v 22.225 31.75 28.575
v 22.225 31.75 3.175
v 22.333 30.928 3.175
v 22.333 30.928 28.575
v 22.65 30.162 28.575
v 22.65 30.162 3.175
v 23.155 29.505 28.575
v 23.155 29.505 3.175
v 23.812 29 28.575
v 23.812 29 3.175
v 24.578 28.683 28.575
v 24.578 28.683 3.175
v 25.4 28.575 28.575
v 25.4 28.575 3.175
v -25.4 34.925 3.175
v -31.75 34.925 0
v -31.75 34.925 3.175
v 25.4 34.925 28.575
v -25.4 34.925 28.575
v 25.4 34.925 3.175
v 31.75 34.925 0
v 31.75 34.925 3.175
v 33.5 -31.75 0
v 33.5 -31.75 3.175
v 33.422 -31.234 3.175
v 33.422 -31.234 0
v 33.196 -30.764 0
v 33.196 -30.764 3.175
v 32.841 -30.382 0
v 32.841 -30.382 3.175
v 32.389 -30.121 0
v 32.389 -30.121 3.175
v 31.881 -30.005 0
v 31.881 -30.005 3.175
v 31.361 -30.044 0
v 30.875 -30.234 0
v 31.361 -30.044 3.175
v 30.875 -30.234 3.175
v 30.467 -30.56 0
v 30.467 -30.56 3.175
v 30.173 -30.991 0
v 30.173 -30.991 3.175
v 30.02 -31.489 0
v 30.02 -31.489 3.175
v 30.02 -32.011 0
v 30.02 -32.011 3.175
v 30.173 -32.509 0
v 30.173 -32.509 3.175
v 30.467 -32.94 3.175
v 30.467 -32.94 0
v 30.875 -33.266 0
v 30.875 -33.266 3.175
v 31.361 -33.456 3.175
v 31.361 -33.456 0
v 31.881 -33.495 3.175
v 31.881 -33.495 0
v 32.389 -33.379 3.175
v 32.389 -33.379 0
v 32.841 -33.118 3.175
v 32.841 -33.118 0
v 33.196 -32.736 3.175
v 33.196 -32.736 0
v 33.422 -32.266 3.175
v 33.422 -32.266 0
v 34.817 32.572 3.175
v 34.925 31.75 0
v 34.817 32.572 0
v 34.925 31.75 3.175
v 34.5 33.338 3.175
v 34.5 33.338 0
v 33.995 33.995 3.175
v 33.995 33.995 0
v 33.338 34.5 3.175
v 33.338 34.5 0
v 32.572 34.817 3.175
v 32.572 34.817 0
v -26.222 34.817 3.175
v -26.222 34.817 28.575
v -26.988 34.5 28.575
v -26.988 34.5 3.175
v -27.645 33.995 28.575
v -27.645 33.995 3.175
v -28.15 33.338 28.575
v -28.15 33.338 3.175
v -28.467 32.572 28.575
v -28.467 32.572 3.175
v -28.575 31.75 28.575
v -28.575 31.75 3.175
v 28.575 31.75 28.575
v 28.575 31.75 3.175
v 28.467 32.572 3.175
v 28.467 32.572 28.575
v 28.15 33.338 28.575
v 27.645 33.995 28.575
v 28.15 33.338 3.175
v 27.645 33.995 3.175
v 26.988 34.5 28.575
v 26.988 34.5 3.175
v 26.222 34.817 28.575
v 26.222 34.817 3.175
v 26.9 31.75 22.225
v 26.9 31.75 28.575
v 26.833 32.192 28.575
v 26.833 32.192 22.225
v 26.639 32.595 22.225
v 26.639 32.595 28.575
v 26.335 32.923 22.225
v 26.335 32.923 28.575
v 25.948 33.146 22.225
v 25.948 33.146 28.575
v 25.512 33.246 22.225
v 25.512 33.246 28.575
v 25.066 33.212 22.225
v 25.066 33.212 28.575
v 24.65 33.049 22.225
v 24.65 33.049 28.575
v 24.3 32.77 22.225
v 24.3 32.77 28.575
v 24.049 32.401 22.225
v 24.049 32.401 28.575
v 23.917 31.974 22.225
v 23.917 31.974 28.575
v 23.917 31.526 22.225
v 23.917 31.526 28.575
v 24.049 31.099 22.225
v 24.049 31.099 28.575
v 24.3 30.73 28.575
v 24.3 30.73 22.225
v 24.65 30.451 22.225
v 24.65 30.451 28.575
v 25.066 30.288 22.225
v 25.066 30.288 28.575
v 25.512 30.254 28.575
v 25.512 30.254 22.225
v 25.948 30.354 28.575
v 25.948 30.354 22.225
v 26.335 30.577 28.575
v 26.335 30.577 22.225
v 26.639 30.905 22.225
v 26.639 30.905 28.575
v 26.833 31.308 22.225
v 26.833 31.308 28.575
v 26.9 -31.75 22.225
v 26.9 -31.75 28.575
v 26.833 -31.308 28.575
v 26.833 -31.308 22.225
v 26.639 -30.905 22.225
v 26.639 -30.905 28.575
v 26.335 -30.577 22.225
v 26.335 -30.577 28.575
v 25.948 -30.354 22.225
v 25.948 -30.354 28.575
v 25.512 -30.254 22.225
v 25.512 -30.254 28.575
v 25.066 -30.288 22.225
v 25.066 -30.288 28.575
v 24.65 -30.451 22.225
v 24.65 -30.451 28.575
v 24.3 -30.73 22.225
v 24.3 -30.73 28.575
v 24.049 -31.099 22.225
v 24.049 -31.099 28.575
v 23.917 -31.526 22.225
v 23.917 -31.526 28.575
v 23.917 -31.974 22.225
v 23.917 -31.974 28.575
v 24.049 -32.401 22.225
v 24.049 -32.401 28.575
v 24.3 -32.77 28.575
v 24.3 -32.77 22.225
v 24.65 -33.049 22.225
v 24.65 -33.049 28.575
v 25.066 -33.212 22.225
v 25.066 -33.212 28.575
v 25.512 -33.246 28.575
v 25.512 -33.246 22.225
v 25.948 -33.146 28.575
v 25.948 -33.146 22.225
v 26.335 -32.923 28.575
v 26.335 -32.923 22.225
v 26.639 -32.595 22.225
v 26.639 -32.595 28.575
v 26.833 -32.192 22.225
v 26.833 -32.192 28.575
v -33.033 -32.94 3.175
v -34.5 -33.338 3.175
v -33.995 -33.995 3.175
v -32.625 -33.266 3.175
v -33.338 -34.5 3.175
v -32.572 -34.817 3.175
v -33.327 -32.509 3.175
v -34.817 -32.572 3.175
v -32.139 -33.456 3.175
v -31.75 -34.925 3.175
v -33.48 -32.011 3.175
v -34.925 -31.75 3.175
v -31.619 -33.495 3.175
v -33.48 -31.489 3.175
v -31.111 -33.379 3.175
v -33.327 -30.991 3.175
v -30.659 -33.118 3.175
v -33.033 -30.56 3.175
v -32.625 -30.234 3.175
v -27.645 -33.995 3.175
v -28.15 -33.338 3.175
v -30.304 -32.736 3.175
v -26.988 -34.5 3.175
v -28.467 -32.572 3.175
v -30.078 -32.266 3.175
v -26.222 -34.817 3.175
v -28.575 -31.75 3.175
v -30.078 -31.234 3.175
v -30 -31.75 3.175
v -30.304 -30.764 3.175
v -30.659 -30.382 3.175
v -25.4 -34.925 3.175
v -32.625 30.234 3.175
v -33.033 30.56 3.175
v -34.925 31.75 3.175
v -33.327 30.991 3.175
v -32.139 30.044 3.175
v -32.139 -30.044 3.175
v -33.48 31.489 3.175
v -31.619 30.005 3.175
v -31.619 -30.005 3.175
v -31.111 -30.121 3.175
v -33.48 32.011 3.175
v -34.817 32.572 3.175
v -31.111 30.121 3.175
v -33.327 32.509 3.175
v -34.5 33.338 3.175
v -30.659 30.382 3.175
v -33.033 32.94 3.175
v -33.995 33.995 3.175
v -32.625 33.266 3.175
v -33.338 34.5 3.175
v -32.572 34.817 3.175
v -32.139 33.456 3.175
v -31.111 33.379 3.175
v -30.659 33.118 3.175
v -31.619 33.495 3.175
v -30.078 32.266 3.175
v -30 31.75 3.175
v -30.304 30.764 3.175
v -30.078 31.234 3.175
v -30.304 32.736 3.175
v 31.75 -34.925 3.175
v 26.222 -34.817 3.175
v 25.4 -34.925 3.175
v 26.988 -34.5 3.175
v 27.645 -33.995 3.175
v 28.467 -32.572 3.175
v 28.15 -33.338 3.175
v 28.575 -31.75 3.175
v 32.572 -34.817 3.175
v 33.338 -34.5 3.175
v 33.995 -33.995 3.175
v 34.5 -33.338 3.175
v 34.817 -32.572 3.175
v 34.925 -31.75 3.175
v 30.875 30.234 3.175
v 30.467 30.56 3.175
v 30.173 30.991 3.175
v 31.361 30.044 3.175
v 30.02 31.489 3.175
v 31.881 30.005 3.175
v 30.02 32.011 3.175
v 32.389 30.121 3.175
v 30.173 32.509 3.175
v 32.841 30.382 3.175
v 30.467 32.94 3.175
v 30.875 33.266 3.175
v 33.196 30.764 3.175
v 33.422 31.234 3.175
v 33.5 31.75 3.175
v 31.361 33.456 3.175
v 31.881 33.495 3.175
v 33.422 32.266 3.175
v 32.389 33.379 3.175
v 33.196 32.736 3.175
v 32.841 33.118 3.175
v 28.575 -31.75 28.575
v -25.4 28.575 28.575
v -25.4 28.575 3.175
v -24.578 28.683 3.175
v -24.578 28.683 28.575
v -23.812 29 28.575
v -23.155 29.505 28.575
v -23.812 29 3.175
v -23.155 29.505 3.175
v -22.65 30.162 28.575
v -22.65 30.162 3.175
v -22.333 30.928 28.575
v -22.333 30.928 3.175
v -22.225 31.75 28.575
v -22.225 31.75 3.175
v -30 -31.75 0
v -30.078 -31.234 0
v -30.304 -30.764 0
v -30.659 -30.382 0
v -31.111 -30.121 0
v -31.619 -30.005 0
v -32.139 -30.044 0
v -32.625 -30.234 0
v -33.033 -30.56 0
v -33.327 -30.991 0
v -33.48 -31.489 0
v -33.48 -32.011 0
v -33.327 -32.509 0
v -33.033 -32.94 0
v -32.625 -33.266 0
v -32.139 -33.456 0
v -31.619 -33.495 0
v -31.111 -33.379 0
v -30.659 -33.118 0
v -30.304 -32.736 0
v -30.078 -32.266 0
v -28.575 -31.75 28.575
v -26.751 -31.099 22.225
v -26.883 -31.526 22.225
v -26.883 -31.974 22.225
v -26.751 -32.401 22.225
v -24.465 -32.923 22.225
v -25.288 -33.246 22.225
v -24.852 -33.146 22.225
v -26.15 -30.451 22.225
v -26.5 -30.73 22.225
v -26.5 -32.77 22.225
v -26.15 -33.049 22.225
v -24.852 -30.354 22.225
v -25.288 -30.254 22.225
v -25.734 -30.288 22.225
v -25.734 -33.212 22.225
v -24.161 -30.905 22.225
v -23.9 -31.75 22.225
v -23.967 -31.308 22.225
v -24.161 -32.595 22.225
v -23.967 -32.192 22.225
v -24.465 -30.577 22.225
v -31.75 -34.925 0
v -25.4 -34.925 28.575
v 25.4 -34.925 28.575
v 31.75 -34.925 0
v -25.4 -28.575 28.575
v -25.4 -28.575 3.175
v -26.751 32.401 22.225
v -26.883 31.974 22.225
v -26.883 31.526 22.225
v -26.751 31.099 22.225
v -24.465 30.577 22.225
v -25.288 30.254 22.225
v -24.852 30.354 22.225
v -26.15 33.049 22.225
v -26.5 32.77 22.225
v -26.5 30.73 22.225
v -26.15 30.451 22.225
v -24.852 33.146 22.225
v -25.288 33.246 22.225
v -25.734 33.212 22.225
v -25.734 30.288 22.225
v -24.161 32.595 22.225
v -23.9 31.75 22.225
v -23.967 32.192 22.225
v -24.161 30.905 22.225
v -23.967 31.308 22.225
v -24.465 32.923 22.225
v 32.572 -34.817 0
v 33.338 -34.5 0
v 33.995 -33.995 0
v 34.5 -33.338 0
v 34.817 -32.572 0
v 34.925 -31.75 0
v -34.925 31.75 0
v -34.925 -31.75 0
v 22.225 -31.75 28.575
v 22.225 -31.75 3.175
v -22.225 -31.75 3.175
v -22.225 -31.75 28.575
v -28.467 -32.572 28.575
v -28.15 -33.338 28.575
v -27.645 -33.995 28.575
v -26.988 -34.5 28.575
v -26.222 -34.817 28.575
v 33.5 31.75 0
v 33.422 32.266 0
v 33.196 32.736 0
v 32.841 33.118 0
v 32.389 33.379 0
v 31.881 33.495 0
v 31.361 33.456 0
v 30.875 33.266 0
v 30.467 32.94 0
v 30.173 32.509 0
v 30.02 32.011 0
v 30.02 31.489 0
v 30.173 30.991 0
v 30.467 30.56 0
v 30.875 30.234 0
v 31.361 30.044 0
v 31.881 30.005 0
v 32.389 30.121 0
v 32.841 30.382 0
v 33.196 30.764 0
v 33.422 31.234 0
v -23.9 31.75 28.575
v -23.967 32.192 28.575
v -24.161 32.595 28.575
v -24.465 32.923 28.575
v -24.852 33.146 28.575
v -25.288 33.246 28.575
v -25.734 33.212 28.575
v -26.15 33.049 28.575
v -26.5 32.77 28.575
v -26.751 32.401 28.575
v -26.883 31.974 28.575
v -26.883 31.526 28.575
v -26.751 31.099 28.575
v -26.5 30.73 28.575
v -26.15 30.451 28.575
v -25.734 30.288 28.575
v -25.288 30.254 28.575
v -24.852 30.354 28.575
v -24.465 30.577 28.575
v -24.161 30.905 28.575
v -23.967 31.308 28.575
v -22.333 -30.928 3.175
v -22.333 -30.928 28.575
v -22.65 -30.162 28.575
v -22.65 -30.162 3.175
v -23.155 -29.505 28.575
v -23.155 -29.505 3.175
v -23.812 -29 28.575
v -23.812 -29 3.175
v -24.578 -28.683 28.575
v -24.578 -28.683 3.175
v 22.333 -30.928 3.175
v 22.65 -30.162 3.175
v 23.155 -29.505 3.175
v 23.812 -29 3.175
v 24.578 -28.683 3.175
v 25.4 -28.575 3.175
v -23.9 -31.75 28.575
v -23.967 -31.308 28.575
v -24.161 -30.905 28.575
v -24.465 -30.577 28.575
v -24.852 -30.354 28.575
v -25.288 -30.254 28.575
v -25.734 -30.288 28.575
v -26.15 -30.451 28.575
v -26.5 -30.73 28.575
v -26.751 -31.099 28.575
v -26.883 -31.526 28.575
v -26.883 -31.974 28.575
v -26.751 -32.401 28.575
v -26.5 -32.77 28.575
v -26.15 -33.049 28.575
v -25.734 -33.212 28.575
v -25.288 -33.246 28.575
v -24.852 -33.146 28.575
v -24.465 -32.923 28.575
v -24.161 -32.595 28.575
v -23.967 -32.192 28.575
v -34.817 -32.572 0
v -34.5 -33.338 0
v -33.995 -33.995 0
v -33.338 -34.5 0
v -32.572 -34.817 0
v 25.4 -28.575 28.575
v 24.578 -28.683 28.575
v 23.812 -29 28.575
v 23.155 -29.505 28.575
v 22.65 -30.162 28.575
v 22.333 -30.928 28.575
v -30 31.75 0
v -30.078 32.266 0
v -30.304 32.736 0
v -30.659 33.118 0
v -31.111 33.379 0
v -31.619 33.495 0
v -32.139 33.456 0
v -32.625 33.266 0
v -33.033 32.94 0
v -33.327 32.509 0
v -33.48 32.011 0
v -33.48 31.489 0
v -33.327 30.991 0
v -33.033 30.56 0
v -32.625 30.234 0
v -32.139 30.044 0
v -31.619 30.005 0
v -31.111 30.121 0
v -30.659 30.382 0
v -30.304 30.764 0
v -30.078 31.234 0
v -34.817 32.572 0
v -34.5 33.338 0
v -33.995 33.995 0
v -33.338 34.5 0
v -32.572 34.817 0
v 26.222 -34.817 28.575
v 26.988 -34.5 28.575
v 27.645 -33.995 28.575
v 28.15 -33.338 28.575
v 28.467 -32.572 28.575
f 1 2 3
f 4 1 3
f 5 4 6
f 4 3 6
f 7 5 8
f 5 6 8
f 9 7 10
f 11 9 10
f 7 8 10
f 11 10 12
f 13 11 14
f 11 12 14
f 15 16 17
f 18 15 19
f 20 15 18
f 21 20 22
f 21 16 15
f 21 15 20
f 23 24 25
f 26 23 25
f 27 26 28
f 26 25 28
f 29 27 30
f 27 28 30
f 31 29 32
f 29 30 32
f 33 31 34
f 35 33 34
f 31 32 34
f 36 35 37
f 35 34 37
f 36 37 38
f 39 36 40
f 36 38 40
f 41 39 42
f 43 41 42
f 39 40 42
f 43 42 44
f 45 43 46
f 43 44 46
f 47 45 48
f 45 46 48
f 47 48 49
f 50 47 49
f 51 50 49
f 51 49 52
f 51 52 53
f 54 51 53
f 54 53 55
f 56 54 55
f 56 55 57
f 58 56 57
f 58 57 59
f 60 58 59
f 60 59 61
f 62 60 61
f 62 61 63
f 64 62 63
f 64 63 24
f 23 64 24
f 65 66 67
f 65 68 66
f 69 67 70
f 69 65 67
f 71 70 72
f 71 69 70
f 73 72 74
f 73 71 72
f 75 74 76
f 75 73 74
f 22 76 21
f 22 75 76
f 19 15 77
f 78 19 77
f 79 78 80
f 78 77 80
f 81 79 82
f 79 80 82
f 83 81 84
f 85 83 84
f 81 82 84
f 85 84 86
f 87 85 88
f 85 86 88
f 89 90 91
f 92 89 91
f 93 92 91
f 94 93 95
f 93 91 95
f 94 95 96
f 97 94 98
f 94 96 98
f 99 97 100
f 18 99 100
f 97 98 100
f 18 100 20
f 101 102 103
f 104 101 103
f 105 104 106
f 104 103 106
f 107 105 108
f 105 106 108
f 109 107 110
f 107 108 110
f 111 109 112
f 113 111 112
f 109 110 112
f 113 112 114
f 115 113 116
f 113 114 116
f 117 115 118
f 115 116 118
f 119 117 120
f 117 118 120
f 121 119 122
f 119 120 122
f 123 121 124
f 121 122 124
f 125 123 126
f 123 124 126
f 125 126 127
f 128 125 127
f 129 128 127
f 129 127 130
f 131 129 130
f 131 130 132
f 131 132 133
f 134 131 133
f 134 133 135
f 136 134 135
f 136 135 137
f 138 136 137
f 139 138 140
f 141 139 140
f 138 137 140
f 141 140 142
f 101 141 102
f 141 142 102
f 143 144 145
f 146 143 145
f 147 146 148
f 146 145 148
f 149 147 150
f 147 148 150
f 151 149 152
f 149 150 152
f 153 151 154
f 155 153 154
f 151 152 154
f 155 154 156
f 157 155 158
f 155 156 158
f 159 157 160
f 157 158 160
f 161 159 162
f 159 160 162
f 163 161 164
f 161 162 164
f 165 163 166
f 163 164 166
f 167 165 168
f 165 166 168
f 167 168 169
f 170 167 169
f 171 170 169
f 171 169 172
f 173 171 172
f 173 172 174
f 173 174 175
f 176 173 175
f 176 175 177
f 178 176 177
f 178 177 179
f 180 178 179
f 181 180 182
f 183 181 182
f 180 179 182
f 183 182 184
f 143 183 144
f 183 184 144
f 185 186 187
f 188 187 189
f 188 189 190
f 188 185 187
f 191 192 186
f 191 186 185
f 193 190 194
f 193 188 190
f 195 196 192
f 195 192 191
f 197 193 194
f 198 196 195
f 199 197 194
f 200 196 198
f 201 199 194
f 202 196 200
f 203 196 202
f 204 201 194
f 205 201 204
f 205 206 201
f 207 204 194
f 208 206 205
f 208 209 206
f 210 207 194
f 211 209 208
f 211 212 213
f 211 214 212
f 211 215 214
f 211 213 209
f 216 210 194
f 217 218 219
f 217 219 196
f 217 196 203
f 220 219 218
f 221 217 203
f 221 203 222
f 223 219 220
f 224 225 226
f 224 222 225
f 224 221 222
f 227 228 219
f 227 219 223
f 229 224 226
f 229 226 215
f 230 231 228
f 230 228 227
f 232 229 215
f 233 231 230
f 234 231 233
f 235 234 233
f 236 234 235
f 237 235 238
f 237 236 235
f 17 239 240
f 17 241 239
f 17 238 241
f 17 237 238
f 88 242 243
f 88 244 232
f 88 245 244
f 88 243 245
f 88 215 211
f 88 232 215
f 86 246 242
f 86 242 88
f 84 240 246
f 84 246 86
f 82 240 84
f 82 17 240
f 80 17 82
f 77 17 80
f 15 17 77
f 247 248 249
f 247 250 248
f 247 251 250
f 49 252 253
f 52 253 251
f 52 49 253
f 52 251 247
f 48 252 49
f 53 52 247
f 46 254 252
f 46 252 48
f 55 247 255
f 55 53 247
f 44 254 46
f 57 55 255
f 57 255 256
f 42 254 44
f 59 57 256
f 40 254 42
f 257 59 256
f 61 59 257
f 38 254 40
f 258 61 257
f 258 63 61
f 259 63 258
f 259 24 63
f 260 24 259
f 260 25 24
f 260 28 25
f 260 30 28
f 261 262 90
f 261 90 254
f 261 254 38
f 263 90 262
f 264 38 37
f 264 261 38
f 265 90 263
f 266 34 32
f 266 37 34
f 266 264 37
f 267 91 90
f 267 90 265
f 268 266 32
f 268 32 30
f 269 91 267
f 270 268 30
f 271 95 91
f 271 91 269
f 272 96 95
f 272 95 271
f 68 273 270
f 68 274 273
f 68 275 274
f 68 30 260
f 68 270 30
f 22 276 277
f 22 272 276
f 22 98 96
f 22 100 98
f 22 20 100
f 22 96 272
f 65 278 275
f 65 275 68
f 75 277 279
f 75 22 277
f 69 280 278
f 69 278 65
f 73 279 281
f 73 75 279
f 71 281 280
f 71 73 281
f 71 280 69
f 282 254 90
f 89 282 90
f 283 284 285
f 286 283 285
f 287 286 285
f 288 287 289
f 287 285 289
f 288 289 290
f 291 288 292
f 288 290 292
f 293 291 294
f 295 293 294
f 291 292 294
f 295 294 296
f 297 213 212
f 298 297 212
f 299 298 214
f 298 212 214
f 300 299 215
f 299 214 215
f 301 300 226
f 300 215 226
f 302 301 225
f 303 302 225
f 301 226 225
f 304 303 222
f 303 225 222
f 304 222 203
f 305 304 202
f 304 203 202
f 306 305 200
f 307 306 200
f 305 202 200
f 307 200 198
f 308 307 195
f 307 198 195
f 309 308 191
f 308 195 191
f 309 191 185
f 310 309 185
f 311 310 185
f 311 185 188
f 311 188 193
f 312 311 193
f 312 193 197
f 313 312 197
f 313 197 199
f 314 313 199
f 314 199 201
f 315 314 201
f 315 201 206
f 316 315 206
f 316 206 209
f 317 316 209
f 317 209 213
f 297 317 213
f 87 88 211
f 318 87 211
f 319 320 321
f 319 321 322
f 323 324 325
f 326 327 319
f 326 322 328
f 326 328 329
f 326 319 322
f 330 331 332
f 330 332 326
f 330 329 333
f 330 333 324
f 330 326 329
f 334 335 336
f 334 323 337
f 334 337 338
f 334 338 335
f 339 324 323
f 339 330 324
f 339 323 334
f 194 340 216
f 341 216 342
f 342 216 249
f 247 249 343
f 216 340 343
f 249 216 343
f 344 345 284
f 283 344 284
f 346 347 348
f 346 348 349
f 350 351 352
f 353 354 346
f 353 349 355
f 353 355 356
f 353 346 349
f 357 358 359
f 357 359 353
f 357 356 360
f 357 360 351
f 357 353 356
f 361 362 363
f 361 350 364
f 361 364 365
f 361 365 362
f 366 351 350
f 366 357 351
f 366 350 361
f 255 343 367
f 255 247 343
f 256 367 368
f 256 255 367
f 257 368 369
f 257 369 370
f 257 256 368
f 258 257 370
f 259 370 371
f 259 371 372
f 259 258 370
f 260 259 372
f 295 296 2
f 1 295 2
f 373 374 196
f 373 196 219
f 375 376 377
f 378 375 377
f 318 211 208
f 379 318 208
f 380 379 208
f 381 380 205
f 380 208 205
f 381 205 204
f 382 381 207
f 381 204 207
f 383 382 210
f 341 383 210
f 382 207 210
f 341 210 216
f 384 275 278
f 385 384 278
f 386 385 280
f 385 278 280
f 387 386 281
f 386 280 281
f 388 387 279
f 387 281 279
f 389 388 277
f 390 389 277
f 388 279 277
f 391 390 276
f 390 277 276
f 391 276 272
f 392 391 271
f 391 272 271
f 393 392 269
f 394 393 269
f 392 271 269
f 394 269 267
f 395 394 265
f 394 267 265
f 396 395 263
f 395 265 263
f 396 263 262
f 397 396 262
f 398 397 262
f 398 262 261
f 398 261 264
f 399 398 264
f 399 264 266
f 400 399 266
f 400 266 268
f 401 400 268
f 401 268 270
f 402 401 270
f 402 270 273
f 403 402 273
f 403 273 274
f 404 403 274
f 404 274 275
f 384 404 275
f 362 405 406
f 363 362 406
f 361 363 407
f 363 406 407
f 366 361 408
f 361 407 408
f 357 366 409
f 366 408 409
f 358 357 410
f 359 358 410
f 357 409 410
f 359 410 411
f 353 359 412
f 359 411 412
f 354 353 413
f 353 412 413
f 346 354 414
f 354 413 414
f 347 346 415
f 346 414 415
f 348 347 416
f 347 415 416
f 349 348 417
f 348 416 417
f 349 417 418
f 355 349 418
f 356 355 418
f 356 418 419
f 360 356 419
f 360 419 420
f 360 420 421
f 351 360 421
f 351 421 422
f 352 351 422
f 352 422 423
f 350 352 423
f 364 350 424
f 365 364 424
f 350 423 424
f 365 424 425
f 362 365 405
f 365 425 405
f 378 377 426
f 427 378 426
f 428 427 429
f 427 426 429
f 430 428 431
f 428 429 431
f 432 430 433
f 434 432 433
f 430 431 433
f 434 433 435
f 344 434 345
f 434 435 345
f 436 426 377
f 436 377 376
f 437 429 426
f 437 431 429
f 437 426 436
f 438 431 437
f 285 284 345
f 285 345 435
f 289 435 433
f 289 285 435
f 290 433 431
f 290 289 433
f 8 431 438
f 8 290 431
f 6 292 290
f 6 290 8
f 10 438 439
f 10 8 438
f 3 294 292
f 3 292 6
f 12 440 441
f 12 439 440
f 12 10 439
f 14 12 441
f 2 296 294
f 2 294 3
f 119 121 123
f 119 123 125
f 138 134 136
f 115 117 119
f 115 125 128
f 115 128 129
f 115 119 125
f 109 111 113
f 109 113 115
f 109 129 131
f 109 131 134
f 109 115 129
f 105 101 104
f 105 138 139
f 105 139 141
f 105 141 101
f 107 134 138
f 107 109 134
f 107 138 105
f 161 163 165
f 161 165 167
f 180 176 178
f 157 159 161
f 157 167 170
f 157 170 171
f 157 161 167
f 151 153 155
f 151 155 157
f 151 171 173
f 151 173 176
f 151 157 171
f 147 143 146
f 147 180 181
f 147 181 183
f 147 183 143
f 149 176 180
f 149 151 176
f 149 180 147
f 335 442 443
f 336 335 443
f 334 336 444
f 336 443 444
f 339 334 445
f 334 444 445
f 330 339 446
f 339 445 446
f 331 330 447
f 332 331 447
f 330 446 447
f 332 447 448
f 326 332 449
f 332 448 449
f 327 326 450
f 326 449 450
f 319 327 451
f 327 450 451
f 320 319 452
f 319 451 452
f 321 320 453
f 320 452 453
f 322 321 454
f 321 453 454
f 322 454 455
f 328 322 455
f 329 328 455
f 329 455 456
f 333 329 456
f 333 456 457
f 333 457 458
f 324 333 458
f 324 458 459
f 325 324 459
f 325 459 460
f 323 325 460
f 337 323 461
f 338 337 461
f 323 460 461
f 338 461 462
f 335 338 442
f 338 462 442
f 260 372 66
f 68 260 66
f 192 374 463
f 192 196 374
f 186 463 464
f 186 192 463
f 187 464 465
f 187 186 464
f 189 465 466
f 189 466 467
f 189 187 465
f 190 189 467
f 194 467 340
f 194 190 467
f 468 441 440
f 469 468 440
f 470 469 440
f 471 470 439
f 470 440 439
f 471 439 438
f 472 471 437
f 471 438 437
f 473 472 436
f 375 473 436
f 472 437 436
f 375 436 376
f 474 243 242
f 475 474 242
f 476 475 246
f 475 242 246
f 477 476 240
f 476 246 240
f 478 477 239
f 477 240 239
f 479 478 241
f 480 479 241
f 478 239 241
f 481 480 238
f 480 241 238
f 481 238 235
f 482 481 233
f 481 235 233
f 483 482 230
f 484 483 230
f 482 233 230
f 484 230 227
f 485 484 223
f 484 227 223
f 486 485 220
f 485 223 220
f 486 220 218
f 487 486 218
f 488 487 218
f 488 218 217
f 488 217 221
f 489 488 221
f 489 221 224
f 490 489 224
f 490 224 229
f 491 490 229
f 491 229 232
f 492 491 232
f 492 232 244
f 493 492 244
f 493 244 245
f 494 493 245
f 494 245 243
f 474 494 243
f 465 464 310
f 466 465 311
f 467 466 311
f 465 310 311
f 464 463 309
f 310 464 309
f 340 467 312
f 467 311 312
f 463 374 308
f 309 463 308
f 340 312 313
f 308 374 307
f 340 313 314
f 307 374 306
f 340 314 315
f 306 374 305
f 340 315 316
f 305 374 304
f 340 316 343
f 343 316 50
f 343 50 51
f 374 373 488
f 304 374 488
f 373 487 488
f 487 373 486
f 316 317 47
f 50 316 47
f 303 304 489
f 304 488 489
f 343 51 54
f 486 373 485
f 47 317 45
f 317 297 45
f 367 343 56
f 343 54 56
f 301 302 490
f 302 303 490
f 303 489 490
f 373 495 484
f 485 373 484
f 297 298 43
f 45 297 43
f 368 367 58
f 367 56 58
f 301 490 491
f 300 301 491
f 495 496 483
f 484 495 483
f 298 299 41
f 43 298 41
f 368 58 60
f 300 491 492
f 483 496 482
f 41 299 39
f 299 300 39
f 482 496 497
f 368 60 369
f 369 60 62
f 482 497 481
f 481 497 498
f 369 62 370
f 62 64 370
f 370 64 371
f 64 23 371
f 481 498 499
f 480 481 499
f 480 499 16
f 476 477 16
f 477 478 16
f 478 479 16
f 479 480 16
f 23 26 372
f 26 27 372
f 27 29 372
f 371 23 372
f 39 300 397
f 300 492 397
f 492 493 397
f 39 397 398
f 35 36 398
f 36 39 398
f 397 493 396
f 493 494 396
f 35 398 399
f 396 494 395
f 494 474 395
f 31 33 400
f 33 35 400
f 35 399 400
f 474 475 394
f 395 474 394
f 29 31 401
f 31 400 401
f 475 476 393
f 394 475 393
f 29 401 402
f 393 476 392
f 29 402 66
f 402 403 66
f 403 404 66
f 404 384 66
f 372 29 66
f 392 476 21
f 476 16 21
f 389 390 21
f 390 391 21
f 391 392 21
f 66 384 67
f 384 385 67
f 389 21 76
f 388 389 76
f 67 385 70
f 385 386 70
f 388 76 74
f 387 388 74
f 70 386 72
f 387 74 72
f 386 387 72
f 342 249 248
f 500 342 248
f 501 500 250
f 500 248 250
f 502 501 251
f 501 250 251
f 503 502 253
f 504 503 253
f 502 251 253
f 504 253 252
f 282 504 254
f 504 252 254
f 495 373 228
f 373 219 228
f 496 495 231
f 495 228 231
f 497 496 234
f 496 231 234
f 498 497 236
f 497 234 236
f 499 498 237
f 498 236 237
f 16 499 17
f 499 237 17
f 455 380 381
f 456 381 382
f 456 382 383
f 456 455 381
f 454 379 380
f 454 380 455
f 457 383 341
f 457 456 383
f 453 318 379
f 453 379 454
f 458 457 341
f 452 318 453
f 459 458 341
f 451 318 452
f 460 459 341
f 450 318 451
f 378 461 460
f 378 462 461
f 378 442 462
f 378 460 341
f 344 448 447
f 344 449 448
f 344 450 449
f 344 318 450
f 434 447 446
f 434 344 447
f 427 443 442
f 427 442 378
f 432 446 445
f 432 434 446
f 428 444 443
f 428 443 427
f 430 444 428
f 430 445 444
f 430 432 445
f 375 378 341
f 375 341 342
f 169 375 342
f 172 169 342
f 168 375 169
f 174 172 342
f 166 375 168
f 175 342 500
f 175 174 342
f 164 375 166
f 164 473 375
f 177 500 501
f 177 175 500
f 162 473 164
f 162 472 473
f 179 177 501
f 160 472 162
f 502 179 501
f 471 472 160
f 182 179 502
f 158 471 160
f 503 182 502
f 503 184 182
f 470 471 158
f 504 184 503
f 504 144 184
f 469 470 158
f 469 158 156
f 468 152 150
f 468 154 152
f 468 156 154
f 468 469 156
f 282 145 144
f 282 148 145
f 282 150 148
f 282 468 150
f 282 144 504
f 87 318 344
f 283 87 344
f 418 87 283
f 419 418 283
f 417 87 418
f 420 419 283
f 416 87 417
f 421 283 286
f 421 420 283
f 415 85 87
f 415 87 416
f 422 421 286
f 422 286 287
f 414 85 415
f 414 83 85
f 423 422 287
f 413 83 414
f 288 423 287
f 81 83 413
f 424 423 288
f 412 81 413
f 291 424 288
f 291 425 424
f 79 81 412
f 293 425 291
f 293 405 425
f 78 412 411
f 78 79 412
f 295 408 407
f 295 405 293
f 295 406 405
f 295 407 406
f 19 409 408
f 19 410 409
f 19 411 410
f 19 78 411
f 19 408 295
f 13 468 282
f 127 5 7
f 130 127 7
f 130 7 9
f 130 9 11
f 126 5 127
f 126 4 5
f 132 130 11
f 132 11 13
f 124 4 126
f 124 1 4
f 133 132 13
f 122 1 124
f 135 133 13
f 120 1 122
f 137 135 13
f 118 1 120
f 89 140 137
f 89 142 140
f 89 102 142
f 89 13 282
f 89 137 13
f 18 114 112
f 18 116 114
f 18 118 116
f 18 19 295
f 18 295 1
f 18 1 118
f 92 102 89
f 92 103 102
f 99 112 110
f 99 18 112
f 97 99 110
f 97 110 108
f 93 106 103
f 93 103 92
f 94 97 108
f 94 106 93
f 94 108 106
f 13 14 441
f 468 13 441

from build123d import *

# Parameters (mm, degrees)
F0_W          = 69.85
F0_H          = 69.85
F1_DEPTH      = 3.175
F2_R          = 3.175
F3_R          = 1.7499965
F4_DEPTH      = 25.4
F4_DEPTH_BACK = 101
F6_DEPTH      = 25.4
F7_R          = 1.499997
F8_DEPTH      = 6.35
F10_W         = 44.45
F10_H         = 57.15
F11_DEPTH     = 1.27
F12_W         = 8.9916
F12_H         = 14.4018
F13_DEPTH     = 10.9982


# Not quite as in the source:
# - an extrude ends at something that could not be found from the text; its depth is read off the source's solid


with BuildPart() as f1:
    # F0 (on Top) → F1 (new body)
    with BuildSketch(Plane.XY):
        Rectangle(F0_W, F0_H)
    extrude(amount=F1_DEPTH)

    # F2
    f2_edges = [f1.edges().sort_by_distance(p)[0] for p in [
        (-34.925, -34.925, 1.5875),
        (34.925, -34.925, 1.5875),
        (34.925, 34.925, 1.5875),
        (-34.925, 34.925, 1.5875),
    ]]
    fillet(f2_edges, radius=F2_R)

    # F3 (on face) → F4 (cut, two sides)
    with BuildSketch(Plane.XY.offset(3.175)) as f4_sk:
        with Locations((-31.75, 31.75)):
            Circle(F3_R)
        with Locations((31.75, 31.75)):
            Circle(F3_R)
        with Locations((31.75, -31.75)):
            Circle(F3_R)
        with Locations((-31.75, -31.75)):
            Circle(F3_R)
    extrude(amount=-F4_DEPTH, mode=Mode.SUBTRACT)
    extrude(f4_sk.sketch, amount=F4_DEPTH_BACK, mode=Mode.SUBTRACT)

    # F5 (on face) → F6 (join)
    with BuildSketch(Plane.XY.offset(3.175)):
        with BuildLine():
            Line((25.4, 34.925), (-25.4, 34.925))
            ThreePointArc((-25.4, 34.925), (-27.6450640303, 33.9950640303), (-28.575, 31.75))
            Line((-28.575, 31.75), (-28.575, -31.75))
            ThreePointArc((-28.575, -31.75), (-27.6450640303, -33.9950640303), (-25.4, -34.925))
            Line((-25.4, -34.925), (25.4, -34.925))
            ThreePointArc((25.4, -34.925), (27.6450640303, -33.9950640303), (28.575, -31.75))
            Line((28.575, -31.75), (28.575, 31.75))
            ThreePointArc((28.575, 31.75), (27.6450640303, 33.9950640303), (25.4, 34.925))
        make_face()
        with BuildLine():
            ThreePointArc((-25.4, 28.575), (-23.1549359697, 29.5049359697), (-22.225, 31.75))
            Line((-22.225, 31.75), (22.225, 31.75))
            ThreePointArc((22.225, 31.75), (23.1549359697, 29.5049359697), (25.4, 28.575))
            Line((25.4, 28.575), (25.4, -28.575))
            ThreePointArc((25.4, -28.575), (23.1549359697, -29.5049359697), (22.225, -31.75))
            Line((22.225, -31.75), (-22.225, -31.75))
            ThreePointArc((-22.225, -31.75), (-23.1549359697, -29.5049359697), (-25.4, -28.575))
            Line((-25.4, -28.575), (-25.4, 28.575))
        make_face(mode=Mode.SUBTRACT)
    extrude(amount=F6_DEPTH)

    # F7 (on face) → F8 (cut)
    with BuildSketch(Plane.XY.offset(28.575)):
        with Locations((-25.4, 31.75)):
            Circle(F7_R)
        with Locations((25.4, 31.75)):
            Circle(F7_R)
        with Locations((25.4, -31.75)):
            Circle(F7_R)
        with Locations((-25.4, -31.75)):
            Circle(F7_R)
    extrude(amount=-F8_DEPTH, mode=Mode.SUBTRACT)


with BuildPart() as f11:
    # F10 (on offset) → F11 (new body)
    with BuildSketch(Plane.XY.offset(6.35)):
        with Locations((0.3046067432, 0.0383506862)):
            Rectangle(F10_W, F10_H)
    extrude(amount=F11_DEPTH)

    # F12 (on face) → F13 (join)
    with BuildSketch(Plane.XY.offset(7.62)):
        with Locations((-12.7947921936, -21.3357493138)):
            Rectangle(F12_W, F12_H)
    extrude(amount=F13_DEPTH)


solid = f1.part
